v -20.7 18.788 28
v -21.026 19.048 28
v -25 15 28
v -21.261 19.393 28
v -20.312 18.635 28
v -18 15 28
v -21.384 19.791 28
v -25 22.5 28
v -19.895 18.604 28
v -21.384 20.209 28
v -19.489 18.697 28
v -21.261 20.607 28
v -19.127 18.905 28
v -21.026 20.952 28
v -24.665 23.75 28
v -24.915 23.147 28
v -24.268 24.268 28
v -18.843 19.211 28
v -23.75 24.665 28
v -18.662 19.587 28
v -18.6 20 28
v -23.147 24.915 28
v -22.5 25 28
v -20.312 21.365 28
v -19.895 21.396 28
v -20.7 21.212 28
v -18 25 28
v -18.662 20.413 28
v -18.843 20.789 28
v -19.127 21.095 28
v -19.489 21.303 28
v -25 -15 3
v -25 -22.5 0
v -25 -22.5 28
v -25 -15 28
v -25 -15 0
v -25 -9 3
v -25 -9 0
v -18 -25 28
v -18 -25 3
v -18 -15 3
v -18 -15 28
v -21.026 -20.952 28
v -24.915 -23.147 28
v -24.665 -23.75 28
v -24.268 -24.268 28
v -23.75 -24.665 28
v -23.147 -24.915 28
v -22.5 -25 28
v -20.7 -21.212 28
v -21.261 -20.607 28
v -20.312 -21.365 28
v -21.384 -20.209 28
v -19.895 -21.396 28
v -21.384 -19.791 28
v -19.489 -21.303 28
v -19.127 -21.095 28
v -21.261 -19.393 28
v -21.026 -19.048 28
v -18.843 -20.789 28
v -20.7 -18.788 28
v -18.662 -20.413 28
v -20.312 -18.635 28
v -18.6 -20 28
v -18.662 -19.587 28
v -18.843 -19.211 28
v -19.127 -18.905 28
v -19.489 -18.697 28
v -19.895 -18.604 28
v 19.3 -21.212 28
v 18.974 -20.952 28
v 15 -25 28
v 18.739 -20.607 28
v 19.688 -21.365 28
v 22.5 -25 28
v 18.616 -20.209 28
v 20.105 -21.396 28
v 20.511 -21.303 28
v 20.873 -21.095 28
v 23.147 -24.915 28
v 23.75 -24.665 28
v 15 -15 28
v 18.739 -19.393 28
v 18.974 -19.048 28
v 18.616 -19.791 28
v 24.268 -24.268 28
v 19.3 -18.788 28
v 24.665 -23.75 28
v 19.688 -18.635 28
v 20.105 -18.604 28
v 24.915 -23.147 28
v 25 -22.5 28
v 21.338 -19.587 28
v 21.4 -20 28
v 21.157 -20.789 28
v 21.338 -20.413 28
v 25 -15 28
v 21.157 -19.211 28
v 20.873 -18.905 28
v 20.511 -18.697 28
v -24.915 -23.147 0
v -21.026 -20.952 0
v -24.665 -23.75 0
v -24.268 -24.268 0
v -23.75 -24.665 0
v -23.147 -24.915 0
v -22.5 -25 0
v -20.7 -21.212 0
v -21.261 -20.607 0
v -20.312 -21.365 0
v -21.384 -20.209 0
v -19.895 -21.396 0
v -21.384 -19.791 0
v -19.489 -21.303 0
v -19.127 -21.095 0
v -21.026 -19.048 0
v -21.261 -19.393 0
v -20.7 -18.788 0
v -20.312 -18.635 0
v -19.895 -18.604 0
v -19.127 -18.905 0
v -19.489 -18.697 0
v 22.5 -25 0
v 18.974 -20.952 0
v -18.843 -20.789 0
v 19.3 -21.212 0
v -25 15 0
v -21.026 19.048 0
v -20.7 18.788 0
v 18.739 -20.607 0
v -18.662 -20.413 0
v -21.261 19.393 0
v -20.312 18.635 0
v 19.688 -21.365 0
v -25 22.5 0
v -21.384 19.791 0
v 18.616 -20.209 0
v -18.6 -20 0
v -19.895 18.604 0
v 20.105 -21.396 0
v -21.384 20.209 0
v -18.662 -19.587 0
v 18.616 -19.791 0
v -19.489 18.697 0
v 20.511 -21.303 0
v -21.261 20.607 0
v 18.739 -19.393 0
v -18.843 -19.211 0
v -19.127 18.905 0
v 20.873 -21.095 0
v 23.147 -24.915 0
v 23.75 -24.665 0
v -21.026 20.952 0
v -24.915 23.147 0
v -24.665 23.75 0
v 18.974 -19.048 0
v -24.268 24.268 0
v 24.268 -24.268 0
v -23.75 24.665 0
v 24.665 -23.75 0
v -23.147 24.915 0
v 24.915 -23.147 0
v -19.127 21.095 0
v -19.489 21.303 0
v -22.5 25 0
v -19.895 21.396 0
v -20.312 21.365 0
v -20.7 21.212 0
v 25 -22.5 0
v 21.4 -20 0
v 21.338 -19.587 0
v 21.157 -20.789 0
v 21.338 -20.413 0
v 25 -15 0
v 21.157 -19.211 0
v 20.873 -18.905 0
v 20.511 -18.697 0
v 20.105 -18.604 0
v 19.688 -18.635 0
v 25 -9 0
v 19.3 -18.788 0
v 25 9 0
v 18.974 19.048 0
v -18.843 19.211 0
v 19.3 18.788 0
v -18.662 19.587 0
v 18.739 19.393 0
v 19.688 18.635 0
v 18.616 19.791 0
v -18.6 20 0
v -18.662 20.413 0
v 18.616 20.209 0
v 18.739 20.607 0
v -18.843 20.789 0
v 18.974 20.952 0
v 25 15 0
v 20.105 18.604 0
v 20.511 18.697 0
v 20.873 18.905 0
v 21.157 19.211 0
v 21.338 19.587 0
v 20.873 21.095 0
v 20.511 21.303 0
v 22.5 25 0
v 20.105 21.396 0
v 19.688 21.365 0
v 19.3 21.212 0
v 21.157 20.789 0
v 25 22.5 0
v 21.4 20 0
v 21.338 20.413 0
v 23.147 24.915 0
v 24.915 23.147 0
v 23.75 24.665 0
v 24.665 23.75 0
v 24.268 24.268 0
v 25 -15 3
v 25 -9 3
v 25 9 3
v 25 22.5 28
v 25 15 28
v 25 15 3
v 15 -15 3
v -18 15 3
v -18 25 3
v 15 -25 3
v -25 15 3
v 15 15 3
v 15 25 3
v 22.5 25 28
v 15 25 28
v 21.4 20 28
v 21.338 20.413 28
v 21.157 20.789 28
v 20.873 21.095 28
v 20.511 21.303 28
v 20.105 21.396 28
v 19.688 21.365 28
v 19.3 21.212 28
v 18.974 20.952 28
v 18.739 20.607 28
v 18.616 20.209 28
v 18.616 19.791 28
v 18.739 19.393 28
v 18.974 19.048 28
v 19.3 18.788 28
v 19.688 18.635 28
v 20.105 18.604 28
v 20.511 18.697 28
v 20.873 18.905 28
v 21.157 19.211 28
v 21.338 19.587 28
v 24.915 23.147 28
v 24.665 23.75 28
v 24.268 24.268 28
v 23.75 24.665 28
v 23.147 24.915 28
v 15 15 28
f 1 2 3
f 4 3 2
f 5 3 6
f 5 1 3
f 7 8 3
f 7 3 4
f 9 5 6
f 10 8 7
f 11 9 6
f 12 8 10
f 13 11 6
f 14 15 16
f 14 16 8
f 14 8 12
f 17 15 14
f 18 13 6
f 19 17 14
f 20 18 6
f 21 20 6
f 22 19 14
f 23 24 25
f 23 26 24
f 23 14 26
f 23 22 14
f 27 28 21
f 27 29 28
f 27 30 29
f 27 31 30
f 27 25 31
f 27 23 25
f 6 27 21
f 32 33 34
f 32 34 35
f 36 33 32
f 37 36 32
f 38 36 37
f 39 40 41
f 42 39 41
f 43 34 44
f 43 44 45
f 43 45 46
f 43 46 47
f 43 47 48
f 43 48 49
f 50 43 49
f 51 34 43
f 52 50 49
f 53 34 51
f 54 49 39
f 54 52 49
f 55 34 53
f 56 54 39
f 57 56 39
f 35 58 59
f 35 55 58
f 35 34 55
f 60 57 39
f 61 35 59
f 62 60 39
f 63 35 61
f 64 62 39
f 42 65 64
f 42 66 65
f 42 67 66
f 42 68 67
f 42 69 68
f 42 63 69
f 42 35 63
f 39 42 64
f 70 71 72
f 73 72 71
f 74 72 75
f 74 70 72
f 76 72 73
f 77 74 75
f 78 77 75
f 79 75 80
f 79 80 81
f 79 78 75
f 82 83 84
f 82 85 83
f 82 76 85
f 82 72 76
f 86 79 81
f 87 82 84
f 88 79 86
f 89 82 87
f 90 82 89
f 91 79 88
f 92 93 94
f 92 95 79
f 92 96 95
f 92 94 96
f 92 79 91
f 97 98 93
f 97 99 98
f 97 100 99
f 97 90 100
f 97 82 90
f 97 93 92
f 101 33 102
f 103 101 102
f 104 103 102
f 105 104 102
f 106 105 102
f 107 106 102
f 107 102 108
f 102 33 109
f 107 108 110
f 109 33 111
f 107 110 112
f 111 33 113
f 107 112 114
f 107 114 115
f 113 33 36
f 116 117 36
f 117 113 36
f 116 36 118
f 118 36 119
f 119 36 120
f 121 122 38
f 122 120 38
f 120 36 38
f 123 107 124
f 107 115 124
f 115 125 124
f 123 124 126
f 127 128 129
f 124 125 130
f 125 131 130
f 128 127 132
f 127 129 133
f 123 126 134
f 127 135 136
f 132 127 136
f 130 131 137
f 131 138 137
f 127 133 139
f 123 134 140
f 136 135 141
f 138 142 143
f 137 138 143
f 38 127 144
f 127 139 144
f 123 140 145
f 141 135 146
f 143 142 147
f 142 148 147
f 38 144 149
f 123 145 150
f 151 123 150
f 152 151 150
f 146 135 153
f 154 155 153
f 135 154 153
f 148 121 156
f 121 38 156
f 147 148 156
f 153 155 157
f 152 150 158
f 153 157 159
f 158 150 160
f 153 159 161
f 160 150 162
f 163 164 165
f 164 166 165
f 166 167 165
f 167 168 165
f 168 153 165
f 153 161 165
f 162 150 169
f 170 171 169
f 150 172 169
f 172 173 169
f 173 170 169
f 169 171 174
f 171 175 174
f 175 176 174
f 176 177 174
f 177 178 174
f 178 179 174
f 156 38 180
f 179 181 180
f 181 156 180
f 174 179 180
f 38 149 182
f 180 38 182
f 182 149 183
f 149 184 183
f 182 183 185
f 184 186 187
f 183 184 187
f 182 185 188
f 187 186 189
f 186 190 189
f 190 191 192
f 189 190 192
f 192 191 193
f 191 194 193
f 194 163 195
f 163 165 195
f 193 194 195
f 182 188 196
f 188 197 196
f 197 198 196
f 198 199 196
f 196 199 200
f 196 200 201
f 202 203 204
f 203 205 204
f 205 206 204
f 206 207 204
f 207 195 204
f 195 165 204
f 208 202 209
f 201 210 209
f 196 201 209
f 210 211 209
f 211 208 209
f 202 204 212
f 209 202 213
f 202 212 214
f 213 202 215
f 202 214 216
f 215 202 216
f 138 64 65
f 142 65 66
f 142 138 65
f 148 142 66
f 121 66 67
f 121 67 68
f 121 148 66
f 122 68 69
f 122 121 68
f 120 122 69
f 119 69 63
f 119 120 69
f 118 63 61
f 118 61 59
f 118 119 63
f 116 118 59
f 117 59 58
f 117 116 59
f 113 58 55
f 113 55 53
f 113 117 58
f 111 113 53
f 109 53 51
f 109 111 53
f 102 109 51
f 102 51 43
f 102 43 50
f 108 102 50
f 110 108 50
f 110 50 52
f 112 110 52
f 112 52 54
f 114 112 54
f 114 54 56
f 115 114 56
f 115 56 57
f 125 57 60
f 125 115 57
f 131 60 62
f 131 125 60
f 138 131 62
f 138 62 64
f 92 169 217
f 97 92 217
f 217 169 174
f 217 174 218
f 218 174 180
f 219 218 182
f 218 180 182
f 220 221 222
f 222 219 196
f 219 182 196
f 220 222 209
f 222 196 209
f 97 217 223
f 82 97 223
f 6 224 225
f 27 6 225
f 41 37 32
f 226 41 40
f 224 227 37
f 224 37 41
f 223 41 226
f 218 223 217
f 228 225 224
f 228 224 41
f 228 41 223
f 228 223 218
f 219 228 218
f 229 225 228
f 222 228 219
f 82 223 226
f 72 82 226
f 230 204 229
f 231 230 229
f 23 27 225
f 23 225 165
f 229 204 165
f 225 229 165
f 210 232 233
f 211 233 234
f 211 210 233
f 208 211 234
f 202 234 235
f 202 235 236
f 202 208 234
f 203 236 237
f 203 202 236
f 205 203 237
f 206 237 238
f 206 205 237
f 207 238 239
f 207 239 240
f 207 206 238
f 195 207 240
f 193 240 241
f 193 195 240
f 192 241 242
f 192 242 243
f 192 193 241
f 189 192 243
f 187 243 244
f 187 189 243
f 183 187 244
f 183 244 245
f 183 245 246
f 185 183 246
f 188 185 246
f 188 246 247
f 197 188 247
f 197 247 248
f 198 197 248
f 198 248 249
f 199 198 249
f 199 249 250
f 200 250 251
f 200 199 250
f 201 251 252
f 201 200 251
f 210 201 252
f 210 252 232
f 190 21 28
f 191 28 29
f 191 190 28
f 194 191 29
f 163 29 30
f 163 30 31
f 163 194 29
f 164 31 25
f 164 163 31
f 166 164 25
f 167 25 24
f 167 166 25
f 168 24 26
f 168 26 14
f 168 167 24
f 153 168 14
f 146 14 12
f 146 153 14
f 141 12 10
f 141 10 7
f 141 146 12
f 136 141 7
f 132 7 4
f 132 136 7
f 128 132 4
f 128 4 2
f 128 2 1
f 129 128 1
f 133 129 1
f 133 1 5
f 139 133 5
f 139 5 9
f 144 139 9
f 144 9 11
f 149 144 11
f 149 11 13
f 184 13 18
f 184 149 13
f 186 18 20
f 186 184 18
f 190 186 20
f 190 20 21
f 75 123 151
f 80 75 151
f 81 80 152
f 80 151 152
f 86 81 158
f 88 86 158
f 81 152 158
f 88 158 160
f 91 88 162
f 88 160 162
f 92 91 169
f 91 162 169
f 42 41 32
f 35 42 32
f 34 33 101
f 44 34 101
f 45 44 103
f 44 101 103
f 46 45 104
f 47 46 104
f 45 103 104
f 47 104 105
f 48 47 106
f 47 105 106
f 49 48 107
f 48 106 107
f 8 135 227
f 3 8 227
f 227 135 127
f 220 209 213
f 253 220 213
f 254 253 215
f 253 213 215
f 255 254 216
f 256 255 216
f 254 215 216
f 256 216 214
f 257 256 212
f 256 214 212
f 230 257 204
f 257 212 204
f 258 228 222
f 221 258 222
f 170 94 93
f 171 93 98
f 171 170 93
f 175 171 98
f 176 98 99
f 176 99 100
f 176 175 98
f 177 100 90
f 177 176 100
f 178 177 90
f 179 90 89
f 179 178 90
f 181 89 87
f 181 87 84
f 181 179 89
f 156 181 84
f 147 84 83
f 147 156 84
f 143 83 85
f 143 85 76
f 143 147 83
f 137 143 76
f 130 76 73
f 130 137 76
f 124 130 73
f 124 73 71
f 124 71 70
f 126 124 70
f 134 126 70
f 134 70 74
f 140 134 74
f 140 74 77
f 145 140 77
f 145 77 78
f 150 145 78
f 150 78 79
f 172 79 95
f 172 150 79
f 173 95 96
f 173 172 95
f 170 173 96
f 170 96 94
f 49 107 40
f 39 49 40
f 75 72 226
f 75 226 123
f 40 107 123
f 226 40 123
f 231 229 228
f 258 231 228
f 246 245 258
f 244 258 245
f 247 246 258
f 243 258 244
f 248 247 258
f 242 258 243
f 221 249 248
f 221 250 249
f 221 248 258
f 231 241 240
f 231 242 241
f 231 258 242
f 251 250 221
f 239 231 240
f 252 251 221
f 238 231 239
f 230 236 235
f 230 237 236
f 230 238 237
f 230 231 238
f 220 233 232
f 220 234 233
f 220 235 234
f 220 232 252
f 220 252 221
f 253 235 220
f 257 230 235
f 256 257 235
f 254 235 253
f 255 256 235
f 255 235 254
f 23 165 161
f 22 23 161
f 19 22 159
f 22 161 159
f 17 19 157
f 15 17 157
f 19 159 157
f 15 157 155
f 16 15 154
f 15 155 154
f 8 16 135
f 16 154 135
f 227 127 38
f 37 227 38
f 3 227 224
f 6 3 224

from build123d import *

# Parameters (mm, degrees)
BOSS_EXTRUDE1_DEPTH = 3
SKETCH1_3_R         = 1.4
BOSS_EXTRUDE2_DEPTH = 28


with BuildPart() as part:
    # Sketch1 → Boss-Extrude1 (new body)
    with BuildSketch(Plane.XY):
        Polygon((25.000000373, 15), (15, 15), (15, 25.000000373), (-18, 25.000000373), (-18, 15), (-25.000000373, 15), (-25.000000373, -15), (-18, -15), (-18, -25.000000373), (15, -25.000000373), (15, -15), (25.000000373, -15), align=None)
    extrude(amount=BOSS_EXTRUDE1_DEPTH)

    # Sketch1<3> → Boss-Extrude2 (add)
    # profile 1 of 4: a face of its own
    with BuildSketch(Plane.XY):
        with BuildLine():
            Line((15, 25.000000373), (15, 15))
            Line((15, 15), (25.000000373, 15))
            Line((25.000000373, 15), (25.000000373, 22.500000373))
            ThreePointArc((25.000000373, 22.500000373), (24.267767325, 24.267767325), (22.500000373, 25.000000373))
            Line((22.500000373, 25.000000373), (15, 25.000000373))
        make_face()
        with Locations((20, 20)):
            Circle(SKETCH1_3_R, mode=Mode.SUBTRACT)
    # profile 2 of 4: a face of its own
    with BuildSketch(Plane.XY):
        with BuildLine():
            Line((-18, 15), (-18, 25.000000373))
            Line((-18, 25.000000373), (-22.500000373, 25.000000373))
            ThreePointArc((-22.500000373, 25.000000373), (-24.267767325, 24.267767325), (-25.000000373, 22.500000373))
            Line((-25.000000373, 22.500000373), (-25.000000373, 15))
            Line((-25.000000373, 15), (-18, 15))
        make_face()
        with Locations((-20, 20)):
            Circle(SKETCH1_3_R, mode=Mode.SUBTRACT)
    # profile 3 of 4: a face of its own
    with BuildSketch(Plane.XY):
        with BuildLine():
            Line((25.000000373, -22.500000373), (25.000000373, -15))
            Line((25.000000373, -15), (15, -15))
            Line((15, -15), (15, -25.000000373))
            Line((15, -25.000000373), (22.500000373, -25.000000373))
            ThreePointArc((22.500000373, -25.000000373), (24.267767325, -24.267767325), (25.000000373, -22.500000373))
        make_face()
        with Locations((20, -20)):
            Circle(SKETCH1_3_R, mode=Mode.SUBTRACT)
    # profile 4 of 4: a face of its own
    with BuildSketch(Plane.XY):
        with BuildLine():
            Line((-22.500000373, -25.000000373), (-18, -25.000000373))
            Line((-18, -25.000000373), (-18, -15))
            Line((-18, -15), (-25.000000373, -15))
            Line((-25.000000373, -15), (-25.000000373, -22.500000373))
            ThreePointArc((-25.000000373, -22.500000373), (-24.267767325, -24.267767325), (-22.500000373, -25.000000373))
        make_face()
        with Locations((-20, -20)):
            Circle(SKETCH1_3_R, mode=Mode.SUBTRACT)
    extrude(amount=BOSS_EXTRUDE2_DEPTH)


solid = part.part
